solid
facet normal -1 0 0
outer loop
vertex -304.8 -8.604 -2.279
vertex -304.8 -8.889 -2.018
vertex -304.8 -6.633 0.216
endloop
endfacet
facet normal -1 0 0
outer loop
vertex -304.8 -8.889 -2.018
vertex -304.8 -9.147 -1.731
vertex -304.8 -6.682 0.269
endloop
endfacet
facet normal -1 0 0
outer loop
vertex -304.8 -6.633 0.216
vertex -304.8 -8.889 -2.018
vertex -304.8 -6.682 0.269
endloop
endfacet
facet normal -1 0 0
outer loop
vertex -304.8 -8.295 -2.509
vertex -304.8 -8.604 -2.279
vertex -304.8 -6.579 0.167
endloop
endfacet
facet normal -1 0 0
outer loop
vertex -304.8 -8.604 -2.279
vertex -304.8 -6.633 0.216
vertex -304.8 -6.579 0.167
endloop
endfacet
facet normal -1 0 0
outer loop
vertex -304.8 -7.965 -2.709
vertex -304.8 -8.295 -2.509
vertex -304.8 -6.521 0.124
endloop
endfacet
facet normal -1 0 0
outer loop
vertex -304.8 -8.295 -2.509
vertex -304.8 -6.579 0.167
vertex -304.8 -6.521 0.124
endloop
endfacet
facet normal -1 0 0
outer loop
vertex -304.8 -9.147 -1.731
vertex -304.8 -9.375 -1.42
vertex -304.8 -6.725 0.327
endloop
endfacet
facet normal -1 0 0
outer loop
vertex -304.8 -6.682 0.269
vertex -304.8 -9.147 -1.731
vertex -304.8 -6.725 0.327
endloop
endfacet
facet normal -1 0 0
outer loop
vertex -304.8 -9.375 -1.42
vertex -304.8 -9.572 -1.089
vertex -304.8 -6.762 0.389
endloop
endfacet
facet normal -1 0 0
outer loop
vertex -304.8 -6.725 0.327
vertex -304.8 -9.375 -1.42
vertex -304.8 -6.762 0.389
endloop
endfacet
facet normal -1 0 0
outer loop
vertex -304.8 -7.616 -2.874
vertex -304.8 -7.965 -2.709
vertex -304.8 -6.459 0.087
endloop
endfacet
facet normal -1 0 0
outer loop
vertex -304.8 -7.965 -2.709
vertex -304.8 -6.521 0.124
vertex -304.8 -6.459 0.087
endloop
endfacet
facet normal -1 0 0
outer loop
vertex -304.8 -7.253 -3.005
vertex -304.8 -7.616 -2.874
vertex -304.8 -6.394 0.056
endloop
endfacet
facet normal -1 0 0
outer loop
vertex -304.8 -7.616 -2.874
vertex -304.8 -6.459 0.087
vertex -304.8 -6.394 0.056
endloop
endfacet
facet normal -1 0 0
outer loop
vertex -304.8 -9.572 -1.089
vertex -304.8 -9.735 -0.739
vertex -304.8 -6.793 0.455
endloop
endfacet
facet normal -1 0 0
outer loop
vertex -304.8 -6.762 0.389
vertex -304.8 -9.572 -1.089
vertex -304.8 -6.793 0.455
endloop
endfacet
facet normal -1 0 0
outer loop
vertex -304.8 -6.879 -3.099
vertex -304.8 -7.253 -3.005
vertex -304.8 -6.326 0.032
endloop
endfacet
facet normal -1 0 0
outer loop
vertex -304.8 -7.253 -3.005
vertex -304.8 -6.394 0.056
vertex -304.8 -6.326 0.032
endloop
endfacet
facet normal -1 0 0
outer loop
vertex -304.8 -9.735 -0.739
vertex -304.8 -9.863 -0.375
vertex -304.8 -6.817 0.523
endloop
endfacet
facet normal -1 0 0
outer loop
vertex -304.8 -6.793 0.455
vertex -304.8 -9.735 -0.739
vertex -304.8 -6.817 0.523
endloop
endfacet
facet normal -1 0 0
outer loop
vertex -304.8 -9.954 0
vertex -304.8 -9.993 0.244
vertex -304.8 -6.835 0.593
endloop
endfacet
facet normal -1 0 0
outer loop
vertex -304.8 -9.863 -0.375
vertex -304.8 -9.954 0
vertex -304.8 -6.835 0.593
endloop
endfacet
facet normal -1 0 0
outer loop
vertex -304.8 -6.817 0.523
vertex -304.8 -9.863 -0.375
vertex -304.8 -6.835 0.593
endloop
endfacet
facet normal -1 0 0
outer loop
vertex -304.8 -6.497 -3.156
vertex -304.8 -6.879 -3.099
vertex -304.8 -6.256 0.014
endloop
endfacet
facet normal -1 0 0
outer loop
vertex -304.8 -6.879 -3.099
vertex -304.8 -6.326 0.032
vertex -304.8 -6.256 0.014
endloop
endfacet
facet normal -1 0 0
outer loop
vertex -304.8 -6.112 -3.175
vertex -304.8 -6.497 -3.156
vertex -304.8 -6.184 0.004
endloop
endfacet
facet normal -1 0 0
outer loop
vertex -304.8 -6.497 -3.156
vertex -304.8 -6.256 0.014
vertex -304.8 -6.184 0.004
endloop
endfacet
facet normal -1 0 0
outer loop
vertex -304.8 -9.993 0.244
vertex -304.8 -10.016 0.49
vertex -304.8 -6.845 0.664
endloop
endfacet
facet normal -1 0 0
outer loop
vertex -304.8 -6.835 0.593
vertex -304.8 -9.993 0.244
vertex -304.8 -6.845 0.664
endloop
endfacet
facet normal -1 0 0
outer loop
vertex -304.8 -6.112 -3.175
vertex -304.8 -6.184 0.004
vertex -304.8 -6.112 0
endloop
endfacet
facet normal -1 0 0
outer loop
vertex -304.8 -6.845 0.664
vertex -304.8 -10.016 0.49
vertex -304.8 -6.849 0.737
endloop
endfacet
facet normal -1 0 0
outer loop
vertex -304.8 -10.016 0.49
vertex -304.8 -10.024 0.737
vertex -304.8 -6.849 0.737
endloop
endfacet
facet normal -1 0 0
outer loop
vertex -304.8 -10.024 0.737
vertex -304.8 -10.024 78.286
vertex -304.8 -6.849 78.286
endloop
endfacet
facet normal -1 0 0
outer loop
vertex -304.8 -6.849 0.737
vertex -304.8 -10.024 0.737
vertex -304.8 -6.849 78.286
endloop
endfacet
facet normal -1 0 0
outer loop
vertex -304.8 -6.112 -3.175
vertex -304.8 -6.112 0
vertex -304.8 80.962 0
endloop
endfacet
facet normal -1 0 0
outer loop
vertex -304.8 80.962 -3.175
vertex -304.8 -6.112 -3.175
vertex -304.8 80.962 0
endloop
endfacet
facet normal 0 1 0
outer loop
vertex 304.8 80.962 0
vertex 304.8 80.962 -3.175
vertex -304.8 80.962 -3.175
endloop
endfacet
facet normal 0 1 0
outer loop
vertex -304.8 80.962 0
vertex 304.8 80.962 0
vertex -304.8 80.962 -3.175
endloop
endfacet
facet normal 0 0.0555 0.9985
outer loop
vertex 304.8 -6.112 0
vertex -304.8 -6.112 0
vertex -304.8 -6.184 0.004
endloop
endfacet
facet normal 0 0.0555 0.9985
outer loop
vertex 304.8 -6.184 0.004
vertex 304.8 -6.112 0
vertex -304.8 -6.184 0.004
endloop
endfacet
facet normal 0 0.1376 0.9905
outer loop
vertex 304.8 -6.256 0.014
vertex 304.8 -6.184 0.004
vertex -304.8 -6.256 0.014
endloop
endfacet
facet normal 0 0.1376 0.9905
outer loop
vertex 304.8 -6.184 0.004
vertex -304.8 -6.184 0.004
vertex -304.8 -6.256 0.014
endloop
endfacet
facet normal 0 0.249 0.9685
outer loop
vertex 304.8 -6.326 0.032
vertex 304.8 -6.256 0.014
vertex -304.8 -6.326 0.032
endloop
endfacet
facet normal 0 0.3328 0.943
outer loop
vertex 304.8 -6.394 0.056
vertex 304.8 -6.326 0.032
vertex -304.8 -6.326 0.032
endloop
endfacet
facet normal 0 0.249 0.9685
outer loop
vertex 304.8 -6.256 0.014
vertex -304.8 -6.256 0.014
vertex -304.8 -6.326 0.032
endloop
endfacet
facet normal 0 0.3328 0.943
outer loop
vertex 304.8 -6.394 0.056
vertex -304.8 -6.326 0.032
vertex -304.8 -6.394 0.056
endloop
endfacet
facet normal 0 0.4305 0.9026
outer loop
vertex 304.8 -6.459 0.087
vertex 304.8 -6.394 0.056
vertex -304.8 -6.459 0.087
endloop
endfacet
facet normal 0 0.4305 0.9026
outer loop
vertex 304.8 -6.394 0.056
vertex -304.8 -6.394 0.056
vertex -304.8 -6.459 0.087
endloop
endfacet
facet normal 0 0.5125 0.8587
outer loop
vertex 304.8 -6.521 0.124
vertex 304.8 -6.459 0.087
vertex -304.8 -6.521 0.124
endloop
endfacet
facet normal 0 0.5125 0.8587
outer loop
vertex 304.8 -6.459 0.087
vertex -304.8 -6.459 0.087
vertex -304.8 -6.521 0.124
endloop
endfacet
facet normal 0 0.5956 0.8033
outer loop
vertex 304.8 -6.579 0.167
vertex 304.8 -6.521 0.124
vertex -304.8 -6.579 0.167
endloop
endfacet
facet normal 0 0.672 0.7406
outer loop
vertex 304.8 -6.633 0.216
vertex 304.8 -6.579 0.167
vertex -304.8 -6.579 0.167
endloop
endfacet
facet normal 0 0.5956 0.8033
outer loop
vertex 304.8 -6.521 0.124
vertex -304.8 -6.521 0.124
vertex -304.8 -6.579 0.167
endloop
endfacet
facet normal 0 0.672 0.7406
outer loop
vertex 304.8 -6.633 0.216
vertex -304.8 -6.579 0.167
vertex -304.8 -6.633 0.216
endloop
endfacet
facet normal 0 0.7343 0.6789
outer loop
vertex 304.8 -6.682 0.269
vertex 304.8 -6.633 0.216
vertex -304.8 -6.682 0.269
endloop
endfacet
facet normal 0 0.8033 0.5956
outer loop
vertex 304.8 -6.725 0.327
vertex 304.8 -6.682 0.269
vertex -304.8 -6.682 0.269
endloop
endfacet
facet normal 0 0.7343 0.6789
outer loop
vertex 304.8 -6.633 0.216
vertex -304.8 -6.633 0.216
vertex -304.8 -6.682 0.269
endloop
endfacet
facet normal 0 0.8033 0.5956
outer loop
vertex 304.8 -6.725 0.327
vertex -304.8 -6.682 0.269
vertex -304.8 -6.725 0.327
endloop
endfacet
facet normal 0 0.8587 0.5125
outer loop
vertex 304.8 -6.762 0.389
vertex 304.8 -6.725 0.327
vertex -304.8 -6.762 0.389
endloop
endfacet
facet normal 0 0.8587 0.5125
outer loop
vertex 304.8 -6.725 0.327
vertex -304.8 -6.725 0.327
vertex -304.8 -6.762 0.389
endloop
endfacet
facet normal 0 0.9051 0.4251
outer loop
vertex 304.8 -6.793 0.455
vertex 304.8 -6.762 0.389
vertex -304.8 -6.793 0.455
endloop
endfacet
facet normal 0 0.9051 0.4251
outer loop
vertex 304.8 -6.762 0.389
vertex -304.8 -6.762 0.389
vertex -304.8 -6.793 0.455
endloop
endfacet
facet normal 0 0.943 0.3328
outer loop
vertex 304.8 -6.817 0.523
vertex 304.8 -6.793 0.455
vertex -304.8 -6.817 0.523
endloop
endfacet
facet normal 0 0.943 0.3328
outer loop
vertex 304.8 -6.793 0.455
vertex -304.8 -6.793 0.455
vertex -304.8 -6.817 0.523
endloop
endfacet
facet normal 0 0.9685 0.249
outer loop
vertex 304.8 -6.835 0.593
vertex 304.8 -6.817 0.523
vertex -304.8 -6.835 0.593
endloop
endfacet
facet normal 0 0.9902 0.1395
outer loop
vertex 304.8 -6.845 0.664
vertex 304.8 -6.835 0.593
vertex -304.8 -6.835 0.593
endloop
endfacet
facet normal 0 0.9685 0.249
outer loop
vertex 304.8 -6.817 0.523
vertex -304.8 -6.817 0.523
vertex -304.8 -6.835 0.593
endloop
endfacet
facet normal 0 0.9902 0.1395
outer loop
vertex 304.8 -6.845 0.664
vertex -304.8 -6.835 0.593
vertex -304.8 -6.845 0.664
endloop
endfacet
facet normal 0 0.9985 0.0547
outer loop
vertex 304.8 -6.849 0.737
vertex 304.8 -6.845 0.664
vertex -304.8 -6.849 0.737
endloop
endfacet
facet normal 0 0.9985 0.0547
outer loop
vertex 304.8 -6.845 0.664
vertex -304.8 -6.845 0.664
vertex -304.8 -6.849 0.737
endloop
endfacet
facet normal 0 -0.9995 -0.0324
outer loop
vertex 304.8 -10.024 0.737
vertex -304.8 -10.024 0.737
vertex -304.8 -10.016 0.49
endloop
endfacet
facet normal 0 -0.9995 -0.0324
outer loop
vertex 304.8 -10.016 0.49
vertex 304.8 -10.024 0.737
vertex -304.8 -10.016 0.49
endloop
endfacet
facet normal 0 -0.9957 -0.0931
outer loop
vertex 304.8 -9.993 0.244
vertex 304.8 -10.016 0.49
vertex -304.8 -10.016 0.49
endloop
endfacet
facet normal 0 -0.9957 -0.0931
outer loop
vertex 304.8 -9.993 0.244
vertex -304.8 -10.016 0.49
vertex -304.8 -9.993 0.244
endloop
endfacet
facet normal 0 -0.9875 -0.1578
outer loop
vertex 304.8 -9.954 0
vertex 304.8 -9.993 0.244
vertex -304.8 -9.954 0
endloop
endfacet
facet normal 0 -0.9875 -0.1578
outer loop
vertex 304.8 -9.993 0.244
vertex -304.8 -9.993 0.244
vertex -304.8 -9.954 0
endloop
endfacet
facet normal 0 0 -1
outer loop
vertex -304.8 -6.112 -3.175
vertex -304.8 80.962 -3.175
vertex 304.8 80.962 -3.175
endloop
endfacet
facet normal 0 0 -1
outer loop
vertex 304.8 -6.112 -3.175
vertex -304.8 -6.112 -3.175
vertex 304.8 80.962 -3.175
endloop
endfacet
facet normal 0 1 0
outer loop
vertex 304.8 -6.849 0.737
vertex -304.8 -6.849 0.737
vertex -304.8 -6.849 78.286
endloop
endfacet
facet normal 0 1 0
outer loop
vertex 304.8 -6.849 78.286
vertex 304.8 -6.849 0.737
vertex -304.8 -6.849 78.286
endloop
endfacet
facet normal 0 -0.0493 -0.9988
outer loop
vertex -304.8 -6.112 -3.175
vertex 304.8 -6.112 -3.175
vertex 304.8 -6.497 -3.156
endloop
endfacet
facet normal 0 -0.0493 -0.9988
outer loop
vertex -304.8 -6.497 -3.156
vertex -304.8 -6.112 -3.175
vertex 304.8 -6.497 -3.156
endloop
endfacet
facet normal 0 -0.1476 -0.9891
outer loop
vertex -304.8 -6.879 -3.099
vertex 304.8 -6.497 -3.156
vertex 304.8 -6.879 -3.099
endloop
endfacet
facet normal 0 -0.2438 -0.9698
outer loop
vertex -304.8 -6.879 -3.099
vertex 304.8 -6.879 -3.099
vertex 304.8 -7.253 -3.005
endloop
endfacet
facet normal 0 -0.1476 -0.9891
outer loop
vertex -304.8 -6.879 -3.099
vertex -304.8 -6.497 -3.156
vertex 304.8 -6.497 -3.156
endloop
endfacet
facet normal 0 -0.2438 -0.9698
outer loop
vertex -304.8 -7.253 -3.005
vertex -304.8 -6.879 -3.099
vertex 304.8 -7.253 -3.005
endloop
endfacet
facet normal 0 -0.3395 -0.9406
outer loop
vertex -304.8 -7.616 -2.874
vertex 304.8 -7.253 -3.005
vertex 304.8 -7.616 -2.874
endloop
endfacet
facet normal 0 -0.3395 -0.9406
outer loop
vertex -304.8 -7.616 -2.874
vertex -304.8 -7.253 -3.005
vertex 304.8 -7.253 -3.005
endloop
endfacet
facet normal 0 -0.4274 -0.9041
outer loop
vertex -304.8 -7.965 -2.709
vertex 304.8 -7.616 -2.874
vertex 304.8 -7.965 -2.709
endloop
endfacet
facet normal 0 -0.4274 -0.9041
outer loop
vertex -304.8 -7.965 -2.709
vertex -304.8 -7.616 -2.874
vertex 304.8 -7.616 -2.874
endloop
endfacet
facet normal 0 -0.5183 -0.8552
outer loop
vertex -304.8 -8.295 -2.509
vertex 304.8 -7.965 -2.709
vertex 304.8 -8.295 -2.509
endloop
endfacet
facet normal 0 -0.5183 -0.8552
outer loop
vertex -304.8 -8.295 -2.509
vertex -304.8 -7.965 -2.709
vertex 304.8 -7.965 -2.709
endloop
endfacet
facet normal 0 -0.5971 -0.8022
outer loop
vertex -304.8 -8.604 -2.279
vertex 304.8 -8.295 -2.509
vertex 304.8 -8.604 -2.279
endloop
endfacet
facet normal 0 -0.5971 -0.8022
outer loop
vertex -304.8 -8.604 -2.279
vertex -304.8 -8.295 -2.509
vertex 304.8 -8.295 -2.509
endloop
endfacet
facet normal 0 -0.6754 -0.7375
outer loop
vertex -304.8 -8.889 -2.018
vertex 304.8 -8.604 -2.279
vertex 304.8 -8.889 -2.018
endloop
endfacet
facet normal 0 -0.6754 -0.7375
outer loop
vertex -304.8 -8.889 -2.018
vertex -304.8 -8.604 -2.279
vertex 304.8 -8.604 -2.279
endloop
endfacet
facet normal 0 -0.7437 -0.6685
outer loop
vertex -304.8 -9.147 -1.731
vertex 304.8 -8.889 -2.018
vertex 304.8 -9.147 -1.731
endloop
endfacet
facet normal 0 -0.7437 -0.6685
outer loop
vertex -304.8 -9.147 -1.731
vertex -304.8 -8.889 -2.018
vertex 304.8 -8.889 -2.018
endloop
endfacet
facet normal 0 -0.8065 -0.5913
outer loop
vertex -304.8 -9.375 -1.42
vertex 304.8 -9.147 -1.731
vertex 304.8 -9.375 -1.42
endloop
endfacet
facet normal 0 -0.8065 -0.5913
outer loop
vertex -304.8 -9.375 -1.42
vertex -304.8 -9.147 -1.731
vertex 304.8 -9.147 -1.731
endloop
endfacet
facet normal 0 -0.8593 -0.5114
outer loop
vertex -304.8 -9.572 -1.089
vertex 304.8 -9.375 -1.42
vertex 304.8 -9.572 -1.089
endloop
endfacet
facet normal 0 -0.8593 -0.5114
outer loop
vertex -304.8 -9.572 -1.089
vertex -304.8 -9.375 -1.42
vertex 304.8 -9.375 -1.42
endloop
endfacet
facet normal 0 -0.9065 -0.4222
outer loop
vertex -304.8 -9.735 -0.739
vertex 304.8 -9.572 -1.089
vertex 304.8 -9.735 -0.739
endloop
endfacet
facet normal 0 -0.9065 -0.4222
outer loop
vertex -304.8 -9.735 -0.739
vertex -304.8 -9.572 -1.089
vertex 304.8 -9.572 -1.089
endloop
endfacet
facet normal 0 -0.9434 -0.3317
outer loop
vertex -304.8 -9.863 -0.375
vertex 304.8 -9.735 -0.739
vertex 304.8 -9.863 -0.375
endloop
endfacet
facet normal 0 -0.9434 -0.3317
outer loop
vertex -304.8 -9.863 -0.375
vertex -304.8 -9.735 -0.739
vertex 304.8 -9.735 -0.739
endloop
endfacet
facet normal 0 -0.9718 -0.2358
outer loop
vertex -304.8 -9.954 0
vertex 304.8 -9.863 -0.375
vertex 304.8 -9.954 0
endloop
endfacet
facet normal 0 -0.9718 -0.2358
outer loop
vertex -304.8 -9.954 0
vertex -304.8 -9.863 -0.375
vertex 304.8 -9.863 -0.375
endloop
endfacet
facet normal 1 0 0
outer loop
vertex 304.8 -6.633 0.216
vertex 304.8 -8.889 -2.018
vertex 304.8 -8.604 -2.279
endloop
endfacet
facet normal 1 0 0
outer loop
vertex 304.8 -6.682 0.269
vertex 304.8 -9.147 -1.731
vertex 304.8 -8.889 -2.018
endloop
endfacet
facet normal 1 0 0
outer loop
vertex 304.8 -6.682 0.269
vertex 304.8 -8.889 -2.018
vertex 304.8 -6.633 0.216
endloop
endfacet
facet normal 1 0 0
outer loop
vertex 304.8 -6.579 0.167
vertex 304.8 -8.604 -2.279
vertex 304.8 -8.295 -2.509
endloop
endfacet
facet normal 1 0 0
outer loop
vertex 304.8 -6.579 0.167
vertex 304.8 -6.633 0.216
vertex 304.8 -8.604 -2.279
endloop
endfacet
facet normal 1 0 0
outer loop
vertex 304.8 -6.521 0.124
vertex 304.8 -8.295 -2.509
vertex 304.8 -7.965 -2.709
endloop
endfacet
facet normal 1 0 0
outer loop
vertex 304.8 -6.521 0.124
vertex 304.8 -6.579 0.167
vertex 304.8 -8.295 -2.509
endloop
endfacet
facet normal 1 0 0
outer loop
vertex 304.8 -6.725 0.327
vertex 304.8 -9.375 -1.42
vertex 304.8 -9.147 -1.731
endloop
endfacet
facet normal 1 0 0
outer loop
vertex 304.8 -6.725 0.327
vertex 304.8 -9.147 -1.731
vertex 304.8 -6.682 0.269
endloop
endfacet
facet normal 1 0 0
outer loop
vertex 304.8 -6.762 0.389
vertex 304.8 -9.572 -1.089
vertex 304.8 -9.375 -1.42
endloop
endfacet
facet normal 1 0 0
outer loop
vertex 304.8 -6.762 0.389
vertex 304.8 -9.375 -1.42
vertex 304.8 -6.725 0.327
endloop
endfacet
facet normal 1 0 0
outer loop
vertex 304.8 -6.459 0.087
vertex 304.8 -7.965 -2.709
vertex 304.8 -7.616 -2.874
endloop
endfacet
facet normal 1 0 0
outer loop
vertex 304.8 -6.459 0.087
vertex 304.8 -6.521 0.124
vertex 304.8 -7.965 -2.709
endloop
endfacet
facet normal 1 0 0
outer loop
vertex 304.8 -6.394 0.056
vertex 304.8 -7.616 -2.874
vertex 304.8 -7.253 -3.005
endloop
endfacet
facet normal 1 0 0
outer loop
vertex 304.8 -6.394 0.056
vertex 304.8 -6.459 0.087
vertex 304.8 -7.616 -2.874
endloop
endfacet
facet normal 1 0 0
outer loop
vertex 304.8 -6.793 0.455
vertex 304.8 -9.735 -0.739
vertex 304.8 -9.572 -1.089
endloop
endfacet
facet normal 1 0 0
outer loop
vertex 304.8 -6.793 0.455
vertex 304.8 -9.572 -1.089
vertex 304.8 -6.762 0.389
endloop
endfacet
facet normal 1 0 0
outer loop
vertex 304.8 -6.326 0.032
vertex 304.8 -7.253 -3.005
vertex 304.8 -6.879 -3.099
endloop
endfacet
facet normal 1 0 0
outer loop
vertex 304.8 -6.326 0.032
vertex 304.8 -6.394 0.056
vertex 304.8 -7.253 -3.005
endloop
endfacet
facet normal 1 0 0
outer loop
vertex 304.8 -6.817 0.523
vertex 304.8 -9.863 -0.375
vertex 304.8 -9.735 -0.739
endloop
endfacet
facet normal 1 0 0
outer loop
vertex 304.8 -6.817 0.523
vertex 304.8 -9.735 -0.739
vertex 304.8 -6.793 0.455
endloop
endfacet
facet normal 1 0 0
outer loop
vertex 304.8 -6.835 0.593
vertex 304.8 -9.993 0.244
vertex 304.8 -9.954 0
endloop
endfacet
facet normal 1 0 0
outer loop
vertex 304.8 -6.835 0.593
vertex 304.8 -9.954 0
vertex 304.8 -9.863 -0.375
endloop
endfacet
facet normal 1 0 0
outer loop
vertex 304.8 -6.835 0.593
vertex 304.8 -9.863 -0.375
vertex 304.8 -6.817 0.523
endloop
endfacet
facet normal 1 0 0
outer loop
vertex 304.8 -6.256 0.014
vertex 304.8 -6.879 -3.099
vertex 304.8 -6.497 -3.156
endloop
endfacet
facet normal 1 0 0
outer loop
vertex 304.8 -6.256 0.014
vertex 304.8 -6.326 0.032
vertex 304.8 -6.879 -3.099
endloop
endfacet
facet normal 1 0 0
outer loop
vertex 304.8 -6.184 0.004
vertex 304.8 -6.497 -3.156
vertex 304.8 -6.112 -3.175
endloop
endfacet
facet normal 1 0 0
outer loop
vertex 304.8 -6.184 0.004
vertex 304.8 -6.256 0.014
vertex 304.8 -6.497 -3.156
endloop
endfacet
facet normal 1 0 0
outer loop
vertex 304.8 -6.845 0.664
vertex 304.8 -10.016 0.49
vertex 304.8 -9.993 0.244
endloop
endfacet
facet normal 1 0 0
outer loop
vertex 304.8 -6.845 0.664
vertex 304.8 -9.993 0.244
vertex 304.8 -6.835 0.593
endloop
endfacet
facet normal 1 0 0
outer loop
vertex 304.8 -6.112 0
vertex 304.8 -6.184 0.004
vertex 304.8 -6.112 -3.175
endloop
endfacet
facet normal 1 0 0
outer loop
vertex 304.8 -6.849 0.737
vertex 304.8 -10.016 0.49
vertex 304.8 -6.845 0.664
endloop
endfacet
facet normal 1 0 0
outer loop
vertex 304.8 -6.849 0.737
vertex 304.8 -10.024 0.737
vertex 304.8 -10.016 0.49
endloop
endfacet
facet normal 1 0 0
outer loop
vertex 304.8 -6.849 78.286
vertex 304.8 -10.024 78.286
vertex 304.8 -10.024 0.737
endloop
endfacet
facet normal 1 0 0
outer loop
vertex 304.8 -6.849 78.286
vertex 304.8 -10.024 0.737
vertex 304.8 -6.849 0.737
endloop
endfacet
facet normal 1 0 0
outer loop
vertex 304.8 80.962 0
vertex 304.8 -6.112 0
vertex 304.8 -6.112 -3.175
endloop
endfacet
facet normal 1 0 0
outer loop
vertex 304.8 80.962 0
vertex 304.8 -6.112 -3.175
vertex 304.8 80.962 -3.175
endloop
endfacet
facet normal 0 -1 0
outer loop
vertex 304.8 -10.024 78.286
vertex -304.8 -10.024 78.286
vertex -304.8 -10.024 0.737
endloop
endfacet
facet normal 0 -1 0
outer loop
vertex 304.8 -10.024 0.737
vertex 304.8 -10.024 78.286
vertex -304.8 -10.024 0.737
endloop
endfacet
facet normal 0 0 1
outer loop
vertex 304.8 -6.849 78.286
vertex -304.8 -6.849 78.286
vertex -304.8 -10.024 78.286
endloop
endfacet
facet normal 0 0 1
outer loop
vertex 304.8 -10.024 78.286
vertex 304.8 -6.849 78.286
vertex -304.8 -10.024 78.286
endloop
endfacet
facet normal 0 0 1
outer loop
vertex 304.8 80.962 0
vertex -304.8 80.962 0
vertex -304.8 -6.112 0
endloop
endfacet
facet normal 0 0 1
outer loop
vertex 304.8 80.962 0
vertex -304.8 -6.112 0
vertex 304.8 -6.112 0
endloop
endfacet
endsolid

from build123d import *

# Parameters (mm, degrees)
SKETCH8_W              = 609.6
SKETCH8_H              = 174.625
BASE_FLANGE4_DEPTH     = 3.175
SKETCHED_START         = -304.8
SKETCHED_BEND4_DEPTH   = 609.6
SKETCHED_BEND4_2_DEPTH = 609.6
SKETCH24_W             = 609.6
SKETCH24_H             = 6.35
CUT_EXTRUDE1_DEPTH     = 328.356760899


# Read off the part's stored shape, not the designer's step: Sketched Bend4
# Sheet-metal steps are written as plain solids
with BuildPart() as part:
    # Sketch8 → Base-Flange4 (new body)
    with BuildSketch(Plane.XY):
        Rectangle(SKETCH8_W, SKETCH8_H)
    extrude(amount=-BASE_FLANGE4_DEPTH)

    # Sketched Bend4 outline → Sketched Bend4 (cut)
    with BuildSketch(Plane.YZ.offset(SKETCHED_START)):
        with BuildLine():
            ThreePointArc((-6.112156128, -3.175), (-8.604076071, -2.278520157), (-9.953774928, 0))
            Line((-9.953774928, 0), (-87.3125, 0))
            Line((-87.3125, 0), (-87.3125, -3.175))
            Line((-87.3125, -3.175), (-6.112156128, -3.175))
        make_face()
    extrude(amount=SKETCHED_BEND4_DEPTH, mode=Mode.SUBTRACT)

    # Sketched Bend4 2 outline → Sketched Bend4 2 (add)
    with BuildSketch(Plane.YZ.offset(SKETCHED_START)):
        with BuildLine():
            Line((-6.848756128, 78.286256128), (-10.023756128, 78.286256128))
            Line((-10.023756128, 78.286256128), (-10.023756128, 0.7366))
            ThreePointArc((-10.023756128, 0.7366), (-10.006221527, 0.366641581), (-9.953774928, 0))
            Line((-9.953774928, 0), (-6.112156128, 0))
            ThreePointArc((-6.112156128, 0), (-6.633010983, 0.215745145), (-6.848756128, 0.7366))
            Line((-6.848756128, 0.7366), (-6.848756128, 78.286256128))
        make_face()
    extrude(amount=SKETCHED_BEND4_2_DEPTH)

    # Sketch24 → Cut-Extrude1 (cut, through all)
    with BuildSketch(Plane(origin=(0, 0, -3.175), x_dir=(-1, 0, 0), z_dir=(0, 0, -1))):
        with Locations((0, 84.1375)):
            Rectangle(SKETCH24_W, SKETCH24_H)
    extrude(amount=-CUT_EXTRUDE1_DEPTH, mode=Mode.SUBTRACT)


solid = part.part
